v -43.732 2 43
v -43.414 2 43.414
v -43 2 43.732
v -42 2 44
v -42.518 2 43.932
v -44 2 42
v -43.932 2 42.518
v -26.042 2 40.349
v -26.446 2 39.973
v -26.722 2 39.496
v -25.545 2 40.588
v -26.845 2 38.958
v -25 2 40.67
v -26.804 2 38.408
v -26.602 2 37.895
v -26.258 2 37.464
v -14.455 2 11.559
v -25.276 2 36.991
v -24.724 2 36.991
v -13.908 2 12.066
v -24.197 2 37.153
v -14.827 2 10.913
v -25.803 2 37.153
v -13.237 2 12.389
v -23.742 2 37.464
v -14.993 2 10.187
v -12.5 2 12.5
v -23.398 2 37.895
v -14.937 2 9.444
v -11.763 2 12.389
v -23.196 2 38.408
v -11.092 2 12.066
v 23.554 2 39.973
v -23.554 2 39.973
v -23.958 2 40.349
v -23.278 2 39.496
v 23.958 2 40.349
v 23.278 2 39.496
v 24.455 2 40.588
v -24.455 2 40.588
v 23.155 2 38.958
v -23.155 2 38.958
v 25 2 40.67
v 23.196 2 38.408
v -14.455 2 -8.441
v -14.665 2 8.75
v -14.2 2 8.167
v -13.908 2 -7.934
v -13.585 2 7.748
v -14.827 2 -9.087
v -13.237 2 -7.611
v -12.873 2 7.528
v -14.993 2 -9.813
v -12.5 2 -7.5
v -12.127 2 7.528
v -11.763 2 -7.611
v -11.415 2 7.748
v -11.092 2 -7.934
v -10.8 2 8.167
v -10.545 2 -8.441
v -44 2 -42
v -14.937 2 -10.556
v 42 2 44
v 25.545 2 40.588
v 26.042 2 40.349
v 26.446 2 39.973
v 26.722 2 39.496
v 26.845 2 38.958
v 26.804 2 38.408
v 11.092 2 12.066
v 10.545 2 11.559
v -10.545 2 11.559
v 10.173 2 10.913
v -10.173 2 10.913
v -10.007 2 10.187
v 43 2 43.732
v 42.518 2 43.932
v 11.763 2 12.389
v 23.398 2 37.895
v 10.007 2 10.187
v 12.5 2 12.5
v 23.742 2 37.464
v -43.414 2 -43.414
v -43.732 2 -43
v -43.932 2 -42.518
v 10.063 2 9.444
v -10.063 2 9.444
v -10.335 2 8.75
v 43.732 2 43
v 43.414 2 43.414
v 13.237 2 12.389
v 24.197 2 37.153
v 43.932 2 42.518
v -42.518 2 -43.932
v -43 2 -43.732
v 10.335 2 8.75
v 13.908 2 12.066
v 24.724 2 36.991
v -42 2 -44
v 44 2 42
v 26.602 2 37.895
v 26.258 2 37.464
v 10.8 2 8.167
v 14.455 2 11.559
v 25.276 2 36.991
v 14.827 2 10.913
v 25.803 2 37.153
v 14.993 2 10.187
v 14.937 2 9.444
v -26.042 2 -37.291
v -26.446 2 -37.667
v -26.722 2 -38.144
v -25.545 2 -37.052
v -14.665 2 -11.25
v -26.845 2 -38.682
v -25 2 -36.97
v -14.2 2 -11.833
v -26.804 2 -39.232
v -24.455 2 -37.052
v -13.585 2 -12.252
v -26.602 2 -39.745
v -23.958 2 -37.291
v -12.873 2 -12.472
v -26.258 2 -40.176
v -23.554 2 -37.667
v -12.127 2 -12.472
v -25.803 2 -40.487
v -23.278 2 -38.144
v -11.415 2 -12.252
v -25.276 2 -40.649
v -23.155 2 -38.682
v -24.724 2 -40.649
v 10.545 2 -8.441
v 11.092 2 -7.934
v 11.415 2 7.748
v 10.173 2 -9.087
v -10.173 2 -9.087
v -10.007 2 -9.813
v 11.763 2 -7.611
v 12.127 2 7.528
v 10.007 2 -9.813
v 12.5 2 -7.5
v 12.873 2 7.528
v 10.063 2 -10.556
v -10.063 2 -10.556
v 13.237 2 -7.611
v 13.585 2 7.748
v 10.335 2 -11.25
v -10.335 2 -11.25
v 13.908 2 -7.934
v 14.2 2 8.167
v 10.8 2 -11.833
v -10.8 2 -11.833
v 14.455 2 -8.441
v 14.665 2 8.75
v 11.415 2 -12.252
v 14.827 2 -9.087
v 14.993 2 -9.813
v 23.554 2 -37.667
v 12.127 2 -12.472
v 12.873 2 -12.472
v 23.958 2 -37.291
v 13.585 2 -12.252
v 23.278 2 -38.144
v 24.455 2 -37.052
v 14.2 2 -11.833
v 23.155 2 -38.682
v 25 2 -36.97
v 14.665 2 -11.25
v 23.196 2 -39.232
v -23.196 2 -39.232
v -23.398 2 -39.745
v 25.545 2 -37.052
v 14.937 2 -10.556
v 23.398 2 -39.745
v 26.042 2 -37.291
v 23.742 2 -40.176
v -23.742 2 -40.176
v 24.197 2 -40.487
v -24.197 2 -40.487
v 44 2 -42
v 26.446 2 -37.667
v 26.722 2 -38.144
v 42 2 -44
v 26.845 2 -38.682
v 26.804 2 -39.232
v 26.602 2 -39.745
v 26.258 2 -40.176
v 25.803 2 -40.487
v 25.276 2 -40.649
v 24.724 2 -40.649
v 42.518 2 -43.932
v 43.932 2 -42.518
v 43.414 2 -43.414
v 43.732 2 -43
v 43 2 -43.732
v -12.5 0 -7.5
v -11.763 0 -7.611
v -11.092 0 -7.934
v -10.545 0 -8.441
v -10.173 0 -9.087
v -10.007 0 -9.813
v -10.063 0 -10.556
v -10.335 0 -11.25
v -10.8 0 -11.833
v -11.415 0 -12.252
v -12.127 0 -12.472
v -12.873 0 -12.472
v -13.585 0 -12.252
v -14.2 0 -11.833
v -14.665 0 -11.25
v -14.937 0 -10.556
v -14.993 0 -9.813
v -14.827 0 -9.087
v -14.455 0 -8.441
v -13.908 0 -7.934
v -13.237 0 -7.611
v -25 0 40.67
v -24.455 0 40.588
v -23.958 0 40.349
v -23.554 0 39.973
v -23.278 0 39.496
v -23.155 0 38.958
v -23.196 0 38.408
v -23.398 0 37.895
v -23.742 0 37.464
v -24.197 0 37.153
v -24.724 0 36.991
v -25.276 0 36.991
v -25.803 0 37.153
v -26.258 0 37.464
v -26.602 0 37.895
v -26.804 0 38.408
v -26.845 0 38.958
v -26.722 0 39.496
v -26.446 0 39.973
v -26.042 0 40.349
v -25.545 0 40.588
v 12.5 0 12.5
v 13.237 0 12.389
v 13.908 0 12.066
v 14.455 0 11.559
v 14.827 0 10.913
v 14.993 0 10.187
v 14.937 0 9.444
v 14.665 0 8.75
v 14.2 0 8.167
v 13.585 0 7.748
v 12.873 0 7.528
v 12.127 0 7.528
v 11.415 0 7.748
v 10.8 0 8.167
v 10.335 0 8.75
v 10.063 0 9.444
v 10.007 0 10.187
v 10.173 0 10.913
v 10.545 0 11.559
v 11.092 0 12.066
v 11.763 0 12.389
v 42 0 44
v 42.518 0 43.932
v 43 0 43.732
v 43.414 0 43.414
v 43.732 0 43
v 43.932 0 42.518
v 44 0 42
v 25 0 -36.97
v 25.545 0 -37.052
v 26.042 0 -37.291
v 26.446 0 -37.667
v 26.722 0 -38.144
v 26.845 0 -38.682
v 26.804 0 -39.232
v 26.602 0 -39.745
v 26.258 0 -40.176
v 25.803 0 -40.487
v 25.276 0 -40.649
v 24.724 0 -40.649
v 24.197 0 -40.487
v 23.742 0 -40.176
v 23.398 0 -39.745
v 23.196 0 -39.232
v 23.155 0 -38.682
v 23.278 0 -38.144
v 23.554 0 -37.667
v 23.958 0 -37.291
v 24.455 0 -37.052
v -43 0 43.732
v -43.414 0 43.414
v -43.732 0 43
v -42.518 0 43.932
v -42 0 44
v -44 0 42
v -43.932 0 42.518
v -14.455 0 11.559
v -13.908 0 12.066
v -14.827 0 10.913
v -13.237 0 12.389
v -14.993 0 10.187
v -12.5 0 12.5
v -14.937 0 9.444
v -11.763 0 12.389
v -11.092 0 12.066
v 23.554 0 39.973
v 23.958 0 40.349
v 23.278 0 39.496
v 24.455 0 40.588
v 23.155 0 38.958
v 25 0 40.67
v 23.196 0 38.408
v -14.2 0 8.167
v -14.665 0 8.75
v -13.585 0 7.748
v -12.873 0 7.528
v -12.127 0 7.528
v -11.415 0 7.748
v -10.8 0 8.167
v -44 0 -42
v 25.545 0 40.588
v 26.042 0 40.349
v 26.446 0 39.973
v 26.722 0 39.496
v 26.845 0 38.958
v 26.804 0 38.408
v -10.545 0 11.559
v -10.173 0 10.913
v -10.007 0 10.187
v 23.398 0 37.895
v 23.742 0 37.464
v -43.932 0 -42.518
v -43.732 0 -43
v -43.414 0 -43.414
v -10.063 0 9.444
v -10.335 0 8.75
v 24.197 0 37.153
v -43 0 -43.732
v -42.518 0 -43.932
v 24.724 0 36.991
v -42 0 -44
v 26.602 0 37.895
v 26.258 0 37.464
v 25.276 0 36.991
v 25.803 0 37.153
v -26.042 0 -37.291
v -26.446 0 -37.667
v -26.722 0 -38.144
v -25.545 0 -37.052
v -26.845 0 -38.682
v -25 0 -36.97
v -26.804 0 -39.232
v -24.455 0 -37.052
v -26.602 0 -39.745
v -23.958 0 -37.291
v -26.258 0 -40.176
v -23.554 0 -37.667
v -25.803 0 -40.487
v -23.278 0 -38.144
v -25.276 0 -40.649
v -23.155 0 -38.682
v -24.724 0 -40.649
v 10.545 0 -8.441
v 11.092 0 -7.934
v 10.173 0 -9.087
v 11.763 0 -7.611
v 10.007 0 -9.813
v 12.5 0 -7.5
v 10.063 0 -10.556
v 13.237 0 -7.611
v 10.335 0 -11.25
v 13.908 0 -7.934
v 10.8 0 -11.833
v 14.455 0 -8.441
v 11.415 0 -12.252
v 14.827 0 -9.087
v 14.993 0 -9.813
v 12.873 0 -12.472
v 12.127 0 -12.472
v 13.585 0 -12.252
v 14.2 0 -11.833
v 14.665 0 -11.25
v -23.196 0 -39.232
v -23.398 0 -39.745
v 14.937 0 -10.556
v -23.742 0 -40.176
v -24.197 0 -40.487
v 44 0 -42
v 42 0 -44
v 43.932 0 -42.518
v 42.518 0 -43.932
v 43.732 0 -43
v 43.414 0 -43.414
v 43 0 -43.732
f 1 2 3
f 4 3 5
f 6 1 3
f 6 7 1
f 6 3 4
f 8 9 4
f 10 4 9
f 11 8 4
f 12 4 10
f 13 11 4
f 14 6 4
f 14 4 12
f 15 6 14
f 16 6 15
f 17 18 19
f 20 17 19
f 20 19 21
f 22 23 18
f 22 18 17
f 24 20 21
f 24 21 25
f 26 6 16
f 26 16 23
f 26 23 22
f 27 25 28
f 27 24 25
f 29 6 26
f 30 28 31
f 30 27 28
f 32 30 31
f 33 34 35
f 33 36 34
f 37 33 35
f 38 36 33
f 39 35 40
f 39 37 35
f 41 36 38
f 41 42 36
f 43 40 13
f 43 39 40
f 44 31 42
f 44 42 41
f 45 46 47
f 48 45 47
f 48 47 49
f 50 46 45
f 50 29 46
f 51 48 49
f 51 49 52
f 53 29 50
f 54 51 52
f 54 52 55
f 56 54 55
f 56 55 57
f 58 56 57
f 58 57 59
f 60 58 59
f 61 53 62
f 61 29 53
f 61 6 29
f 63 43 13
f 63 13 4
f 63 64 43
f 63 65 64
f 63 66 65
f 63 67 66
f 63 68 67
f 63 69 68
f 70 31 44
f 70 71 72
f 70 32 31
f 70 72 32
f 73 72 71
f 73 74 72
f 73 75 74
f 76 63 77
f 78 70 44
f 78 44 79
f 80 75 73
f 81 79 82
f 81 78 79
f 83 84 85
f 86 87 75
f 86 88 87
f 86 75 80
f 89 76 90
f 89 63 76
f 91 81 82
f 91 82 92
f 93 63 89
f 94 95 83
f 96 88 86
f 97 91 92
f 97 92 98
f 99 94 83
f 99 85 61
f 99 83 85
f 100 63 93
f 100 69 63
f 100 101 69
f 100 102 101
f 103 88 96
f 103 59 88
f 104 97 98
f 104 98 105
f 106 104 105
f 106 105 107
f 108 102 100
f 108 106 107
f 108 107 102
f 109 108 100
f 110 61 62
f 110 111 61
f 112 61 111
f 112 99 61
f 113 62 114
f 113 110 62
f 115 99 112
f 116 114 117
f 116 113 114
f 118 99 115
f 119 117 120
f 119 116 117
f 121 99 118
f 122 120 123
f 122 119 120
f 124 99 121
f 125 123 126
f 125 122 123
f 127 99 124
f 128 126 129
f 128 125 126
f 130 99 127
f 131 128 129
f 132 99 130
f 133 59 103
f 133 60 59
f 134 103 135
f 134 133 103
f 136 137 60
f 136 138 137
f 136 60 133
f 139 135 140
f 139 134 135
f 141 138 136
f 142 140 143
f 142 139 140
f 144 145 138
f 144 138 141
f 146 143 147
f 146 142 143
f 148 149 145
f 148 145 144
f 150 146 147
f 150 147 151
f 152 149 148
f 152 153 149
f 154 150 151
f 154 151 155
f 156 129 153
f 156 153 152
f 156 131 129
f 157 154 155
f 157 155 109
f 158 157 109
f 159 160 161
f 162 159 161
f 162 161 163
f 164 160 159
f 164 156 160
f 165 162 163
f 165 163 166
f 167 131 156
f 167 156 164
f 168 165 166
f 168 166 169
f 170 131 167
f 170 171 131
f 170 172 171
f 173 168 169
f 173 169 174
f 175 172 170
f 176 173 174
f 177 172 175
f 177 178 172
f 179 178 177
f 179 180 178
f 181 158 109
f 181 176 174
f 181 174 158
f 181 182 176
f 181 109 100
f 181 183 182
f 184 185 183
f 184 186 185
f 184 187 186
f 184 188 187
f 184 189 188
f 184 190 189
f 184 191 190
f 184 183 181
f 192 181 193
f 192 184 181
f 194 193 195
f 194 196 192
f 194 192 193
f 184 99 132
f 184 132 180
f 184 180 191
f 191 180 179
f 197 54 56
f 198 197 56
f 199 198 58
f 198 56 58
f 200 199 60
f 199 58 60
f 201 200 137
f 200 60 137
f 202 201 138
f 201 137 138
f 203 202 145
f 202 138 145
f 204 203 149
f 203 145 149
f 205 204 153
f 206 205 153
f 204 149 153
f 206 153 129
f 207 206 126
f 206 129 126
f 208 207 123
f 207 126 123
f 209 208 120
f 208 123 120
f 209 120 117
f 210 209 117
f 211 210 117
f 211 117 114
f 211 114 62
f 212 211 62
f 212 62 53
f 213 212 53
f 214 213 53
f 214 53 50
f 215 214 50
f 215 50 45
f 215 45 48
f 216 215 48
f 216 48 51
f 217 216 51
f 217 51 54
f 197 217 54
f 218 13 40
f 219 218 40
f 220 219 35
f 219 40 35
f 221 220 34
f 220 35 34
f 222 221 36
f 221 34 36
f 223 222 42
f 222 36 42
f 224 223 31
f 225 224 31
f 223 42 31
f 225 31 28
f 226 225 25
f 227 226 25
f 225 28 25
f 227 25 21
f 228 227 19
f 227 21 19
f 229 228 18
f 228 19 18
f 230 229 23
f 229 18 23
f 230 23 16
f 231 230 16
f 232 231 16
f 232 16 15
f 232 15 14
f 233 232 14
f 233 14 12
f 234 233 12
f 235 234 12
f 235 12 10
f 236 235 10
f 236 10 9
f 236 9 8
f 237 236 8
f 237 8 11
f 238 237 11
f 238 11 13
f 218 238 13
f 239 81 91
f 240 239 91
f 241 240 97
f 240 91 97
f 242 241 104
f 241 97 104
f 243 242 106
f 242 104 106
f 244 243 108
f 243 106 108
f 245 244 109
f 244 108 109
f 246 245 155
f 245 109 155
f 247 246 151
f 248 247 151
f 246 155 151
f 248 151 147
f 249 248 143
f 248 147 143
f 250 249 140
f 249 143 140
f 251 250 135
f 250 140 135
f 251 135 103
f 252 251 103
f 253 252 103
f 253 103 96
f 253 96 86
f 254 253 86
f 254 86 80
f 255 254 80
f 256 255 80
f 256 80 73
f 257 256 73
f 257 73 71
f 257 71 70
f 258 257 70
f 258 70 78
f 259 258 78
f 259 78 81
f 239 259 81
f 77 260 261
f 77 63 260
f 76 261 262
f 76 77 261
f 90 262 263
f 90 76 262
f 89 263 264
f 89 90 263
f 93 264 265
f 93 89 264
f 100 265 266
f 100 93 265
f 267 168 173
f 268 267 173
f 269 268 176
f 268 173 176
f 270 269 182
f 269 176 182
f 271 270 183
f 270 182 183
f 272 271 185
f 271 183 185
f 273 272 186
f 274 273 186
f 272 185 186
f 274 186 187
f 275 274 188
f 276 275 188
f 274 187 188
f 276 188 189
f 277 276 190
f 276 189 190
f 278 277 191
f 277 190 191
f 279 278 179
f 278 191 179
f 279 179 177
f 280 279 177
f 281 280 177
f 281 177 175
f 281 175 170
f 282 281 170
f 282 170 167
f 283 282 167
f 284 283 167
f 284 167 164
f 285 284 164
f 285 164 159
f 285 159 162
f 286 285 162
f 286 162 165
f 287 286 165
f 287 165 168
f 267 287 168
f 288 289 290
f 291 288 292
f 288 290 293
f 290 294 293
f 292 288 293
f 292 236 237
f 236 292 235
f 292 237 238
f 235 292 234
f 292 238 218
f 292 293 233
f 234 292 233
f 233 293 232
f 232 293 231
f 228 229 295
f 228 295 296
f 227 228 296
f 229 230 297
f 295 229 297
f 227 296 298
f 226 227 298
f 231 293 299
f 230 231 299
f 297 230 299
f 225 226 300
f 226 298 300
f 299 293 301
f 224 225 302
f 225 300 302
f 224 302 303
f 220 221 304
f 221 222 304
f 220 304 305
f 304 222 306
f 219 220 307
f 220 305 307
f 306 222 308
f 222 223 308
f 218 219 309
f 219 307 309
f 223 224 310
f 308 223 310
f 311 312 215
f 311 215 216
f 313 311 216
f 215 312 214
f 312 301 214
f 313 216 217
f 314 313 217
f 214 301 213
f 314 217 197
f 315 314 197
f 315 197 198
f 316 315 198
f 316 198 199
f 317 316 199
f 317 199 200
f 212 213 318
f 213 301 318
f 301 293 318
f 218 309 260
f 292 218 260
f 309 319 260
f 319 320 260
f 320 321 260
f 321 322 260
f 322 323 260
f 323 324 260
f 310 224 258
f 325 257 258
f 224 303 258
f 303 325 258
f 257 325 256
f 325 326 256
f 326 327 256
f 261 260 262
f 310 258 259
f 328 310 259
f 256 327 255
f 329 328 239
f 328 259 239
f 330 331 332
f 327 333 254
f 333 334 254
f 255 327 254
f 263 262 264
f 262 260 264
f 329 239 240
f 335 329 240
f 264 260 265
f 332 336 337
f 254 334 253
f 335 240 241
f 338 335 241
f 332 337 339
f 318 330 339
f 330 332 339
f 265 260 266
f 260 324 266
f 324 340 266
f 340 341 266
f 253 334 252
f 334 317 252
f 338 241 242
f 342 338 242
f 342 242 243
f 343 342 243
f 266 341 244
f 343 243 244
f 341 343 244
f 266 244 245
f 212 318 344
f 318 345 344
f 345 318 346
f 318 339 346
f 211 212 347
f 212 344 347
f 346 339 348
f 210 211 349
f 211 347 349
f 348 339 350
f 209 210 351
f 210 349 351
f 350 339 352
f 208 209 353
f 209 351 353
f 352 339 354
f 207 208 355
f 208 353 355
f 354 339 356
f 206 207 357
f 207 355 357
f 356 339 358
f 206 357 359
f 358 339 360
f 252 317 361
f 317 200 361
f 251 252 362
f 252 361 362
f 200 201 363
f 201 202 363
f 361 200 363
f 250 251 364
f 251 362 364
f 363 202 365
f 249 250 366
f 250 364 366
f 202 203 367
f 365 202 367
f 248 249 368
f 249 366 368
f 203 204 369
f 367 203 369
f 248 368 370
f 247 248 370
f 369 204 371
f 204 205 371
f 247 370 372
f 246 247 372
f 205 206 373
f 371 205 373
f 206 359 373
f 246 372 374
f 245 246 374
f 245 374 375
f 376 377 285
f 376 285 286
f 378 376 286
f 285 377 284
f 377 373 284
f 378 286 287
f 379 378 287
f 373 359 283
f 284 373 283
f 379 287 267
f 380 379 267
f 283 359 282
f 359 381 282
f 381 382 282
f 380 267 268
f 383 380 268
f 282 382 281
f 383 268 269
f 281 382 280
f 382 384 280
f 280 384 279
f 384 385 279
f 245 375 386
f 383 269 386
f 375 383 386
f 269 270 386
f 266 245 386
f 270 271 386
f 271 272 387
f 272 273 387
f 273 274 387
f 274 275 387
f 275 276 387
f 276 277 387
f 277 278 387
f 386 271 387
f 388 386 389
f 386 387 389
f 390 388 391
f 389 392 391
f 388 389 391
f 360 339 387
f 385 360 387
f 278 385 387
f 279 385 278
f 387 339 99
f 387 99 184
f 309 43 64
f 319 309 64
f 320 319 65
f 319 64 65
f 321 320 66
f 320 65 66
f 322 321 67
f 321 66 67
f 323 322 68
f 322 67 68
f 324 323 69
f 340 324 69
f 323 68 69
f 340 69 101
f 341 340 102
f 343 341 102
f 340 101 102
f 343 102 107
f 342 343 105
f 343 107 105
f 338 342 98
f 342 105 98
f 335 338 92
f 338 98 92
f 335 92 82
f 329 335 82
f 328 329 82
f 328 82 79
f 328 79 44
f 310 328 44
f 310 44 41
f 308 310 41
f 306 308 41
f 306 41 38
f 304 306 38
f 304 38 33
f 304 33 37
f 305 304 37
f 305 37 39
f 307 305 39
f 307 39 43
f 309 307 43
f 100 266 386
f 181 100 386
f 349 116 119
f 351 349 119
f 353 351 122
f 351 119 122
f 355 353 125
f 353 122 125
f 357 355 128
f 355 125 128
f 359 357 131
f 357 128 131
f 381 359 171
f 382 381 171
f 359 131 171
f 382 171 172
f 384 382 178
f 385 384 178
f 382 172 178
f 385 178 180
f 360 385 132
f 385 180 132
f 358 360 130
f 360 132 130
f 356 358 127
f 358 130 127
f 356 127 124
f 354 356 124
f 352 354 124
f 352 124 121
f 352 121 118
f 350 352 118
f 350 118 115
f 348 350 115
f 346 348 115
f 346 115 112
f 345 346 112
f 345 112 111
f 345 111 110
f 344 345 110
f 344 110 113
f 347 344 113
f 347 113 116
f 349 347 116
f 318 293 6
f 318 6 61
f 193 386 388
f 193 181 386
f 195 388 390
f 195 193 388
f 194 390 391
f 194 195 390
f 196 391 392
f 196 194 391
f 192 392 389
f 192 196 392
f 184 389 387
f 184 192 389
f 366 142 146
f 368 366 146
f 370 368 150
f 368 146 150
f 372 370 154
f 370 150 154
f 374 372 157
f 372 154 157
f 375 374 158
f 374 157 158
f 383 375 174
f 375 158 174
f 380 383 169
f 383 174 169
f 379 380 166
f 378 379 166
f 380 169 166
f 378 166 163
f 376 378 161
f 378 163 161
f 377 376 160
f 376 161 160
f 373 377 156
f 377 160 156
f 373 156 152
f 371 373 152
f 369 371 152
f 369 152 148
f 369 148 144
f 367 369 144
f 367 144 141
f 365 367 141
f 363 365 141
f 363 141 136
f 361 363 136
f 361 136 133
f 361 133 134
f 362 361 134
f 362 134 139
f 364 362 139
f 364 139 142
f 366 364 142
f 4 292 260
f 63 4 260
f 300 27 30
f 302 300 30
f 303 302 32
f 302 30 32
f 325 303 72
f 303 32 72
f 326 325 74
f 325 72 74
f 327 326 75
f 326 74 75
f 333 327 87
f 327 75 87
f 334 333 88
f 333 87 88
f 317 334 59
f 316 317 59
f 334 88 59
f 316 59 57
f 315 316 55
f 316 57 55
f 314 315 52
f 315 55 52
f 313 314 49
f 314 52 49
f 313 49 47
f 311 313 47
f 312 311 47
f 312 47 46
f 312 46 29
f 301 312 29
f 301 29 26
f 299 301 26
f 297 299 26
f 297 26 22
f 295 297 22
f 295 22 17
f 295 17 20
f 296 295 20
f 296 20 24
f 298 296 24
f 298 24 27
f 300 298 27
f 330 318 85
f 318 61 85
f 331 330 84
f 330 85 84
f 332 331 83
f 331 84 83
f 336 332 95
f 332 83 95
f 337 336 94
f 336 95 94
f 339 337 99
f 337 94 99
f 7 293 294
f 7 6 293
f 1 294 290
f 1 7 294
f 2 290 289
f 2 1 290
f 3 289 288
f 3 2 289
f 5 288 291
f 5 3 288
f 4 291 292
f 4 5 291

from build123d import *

# Parameters (mm, degrees)
SKETCH1_W           = 88
SKETCH1_H           = 88
BOSS_EXTRUDE1_DEPTH = 2
FILLET1_R           = 2
SKETCH3_R           = 1.85
CUT_EXTRUDE1_DEPTH  = 10
SKETCH4_R           = 2.5
CUT_EXTRUDE2_DEPTH  = 10


with BuildPart() as part:
    # Sketch1 → Boss-Extrude1 (new body)
    with BuildSketch(Plane(origin=(0, 0, 0), x_dir=(1, 0, 0), z_dir=(0, 1, 0))):
        Rectangle(SKETCH1_W, SKETCH1_H)
    extrude(amount=BOSS_EXTRUDE1_DEPTH)

    # Fillet1
    fillet1_edges = [part.edges().sort_by_distance(p)[0] for p in [
        (-44, 1, -44),
        (44, 1, -44),
        (44, 1, 44),
        (-44, 1, 44),
    ]]
    fillet(fillet1_edges, radius=FILLET1_R)

    # Sketch3 → Cut-Extrude1 (cut)
    with BuildSketch(Plane(origin=(0, 2, 0), x_dir=(1, 0, 0), z_dir=(0, 1, 0))):
        with Locations(Location((-25, 38.82, 0), (0, 0, 270))):
            Circle(SKETCH3_R)
        with Locations(Location((25, 38.82, 0), (0, 0, 270))):
            Circle(SKETCH3_R)
        with Locations(Location((-25, -38.82, 0), (0, 0, 270))):
            Circle(SKETCH3_R)
        with Locations(Location((25, -38.82, 0), (0, 0, 270))):
            Circle(SKETCH3_R)
    extrude(amount=-CUT_EXTRUDE1_DEPTH, mode=Mode.SUBTRACT)

    # Sketch4 → Cut-Extrude2 (cut)
    with BuildSketch(Plane(origin=(0, 2, 0), x_dir=(1, 0, 0), z_dir=(0, 1, 0))):
        with Locations(Location((-12.5, 10, 0), (0, 0, 270))):
            Circle(SKETCH4_R)
        with Locations(Location((-12.5, -10, 0), (0, 0, 270))):
            Circle(SKETCH4_R)
        with Locations(Location((12.5, -10, 0), (0, 0, 270))):
            Circle(SKETCH4_R)
        with Locations(Location((12.5, 10, 0), (0, 0, 270))):
            Circle(SKETCH4_R)
    extrude(amount=-CUT_EXTRUDE2_DEPTH, mode=Mode.SUBTRACT)


solid = part.part
